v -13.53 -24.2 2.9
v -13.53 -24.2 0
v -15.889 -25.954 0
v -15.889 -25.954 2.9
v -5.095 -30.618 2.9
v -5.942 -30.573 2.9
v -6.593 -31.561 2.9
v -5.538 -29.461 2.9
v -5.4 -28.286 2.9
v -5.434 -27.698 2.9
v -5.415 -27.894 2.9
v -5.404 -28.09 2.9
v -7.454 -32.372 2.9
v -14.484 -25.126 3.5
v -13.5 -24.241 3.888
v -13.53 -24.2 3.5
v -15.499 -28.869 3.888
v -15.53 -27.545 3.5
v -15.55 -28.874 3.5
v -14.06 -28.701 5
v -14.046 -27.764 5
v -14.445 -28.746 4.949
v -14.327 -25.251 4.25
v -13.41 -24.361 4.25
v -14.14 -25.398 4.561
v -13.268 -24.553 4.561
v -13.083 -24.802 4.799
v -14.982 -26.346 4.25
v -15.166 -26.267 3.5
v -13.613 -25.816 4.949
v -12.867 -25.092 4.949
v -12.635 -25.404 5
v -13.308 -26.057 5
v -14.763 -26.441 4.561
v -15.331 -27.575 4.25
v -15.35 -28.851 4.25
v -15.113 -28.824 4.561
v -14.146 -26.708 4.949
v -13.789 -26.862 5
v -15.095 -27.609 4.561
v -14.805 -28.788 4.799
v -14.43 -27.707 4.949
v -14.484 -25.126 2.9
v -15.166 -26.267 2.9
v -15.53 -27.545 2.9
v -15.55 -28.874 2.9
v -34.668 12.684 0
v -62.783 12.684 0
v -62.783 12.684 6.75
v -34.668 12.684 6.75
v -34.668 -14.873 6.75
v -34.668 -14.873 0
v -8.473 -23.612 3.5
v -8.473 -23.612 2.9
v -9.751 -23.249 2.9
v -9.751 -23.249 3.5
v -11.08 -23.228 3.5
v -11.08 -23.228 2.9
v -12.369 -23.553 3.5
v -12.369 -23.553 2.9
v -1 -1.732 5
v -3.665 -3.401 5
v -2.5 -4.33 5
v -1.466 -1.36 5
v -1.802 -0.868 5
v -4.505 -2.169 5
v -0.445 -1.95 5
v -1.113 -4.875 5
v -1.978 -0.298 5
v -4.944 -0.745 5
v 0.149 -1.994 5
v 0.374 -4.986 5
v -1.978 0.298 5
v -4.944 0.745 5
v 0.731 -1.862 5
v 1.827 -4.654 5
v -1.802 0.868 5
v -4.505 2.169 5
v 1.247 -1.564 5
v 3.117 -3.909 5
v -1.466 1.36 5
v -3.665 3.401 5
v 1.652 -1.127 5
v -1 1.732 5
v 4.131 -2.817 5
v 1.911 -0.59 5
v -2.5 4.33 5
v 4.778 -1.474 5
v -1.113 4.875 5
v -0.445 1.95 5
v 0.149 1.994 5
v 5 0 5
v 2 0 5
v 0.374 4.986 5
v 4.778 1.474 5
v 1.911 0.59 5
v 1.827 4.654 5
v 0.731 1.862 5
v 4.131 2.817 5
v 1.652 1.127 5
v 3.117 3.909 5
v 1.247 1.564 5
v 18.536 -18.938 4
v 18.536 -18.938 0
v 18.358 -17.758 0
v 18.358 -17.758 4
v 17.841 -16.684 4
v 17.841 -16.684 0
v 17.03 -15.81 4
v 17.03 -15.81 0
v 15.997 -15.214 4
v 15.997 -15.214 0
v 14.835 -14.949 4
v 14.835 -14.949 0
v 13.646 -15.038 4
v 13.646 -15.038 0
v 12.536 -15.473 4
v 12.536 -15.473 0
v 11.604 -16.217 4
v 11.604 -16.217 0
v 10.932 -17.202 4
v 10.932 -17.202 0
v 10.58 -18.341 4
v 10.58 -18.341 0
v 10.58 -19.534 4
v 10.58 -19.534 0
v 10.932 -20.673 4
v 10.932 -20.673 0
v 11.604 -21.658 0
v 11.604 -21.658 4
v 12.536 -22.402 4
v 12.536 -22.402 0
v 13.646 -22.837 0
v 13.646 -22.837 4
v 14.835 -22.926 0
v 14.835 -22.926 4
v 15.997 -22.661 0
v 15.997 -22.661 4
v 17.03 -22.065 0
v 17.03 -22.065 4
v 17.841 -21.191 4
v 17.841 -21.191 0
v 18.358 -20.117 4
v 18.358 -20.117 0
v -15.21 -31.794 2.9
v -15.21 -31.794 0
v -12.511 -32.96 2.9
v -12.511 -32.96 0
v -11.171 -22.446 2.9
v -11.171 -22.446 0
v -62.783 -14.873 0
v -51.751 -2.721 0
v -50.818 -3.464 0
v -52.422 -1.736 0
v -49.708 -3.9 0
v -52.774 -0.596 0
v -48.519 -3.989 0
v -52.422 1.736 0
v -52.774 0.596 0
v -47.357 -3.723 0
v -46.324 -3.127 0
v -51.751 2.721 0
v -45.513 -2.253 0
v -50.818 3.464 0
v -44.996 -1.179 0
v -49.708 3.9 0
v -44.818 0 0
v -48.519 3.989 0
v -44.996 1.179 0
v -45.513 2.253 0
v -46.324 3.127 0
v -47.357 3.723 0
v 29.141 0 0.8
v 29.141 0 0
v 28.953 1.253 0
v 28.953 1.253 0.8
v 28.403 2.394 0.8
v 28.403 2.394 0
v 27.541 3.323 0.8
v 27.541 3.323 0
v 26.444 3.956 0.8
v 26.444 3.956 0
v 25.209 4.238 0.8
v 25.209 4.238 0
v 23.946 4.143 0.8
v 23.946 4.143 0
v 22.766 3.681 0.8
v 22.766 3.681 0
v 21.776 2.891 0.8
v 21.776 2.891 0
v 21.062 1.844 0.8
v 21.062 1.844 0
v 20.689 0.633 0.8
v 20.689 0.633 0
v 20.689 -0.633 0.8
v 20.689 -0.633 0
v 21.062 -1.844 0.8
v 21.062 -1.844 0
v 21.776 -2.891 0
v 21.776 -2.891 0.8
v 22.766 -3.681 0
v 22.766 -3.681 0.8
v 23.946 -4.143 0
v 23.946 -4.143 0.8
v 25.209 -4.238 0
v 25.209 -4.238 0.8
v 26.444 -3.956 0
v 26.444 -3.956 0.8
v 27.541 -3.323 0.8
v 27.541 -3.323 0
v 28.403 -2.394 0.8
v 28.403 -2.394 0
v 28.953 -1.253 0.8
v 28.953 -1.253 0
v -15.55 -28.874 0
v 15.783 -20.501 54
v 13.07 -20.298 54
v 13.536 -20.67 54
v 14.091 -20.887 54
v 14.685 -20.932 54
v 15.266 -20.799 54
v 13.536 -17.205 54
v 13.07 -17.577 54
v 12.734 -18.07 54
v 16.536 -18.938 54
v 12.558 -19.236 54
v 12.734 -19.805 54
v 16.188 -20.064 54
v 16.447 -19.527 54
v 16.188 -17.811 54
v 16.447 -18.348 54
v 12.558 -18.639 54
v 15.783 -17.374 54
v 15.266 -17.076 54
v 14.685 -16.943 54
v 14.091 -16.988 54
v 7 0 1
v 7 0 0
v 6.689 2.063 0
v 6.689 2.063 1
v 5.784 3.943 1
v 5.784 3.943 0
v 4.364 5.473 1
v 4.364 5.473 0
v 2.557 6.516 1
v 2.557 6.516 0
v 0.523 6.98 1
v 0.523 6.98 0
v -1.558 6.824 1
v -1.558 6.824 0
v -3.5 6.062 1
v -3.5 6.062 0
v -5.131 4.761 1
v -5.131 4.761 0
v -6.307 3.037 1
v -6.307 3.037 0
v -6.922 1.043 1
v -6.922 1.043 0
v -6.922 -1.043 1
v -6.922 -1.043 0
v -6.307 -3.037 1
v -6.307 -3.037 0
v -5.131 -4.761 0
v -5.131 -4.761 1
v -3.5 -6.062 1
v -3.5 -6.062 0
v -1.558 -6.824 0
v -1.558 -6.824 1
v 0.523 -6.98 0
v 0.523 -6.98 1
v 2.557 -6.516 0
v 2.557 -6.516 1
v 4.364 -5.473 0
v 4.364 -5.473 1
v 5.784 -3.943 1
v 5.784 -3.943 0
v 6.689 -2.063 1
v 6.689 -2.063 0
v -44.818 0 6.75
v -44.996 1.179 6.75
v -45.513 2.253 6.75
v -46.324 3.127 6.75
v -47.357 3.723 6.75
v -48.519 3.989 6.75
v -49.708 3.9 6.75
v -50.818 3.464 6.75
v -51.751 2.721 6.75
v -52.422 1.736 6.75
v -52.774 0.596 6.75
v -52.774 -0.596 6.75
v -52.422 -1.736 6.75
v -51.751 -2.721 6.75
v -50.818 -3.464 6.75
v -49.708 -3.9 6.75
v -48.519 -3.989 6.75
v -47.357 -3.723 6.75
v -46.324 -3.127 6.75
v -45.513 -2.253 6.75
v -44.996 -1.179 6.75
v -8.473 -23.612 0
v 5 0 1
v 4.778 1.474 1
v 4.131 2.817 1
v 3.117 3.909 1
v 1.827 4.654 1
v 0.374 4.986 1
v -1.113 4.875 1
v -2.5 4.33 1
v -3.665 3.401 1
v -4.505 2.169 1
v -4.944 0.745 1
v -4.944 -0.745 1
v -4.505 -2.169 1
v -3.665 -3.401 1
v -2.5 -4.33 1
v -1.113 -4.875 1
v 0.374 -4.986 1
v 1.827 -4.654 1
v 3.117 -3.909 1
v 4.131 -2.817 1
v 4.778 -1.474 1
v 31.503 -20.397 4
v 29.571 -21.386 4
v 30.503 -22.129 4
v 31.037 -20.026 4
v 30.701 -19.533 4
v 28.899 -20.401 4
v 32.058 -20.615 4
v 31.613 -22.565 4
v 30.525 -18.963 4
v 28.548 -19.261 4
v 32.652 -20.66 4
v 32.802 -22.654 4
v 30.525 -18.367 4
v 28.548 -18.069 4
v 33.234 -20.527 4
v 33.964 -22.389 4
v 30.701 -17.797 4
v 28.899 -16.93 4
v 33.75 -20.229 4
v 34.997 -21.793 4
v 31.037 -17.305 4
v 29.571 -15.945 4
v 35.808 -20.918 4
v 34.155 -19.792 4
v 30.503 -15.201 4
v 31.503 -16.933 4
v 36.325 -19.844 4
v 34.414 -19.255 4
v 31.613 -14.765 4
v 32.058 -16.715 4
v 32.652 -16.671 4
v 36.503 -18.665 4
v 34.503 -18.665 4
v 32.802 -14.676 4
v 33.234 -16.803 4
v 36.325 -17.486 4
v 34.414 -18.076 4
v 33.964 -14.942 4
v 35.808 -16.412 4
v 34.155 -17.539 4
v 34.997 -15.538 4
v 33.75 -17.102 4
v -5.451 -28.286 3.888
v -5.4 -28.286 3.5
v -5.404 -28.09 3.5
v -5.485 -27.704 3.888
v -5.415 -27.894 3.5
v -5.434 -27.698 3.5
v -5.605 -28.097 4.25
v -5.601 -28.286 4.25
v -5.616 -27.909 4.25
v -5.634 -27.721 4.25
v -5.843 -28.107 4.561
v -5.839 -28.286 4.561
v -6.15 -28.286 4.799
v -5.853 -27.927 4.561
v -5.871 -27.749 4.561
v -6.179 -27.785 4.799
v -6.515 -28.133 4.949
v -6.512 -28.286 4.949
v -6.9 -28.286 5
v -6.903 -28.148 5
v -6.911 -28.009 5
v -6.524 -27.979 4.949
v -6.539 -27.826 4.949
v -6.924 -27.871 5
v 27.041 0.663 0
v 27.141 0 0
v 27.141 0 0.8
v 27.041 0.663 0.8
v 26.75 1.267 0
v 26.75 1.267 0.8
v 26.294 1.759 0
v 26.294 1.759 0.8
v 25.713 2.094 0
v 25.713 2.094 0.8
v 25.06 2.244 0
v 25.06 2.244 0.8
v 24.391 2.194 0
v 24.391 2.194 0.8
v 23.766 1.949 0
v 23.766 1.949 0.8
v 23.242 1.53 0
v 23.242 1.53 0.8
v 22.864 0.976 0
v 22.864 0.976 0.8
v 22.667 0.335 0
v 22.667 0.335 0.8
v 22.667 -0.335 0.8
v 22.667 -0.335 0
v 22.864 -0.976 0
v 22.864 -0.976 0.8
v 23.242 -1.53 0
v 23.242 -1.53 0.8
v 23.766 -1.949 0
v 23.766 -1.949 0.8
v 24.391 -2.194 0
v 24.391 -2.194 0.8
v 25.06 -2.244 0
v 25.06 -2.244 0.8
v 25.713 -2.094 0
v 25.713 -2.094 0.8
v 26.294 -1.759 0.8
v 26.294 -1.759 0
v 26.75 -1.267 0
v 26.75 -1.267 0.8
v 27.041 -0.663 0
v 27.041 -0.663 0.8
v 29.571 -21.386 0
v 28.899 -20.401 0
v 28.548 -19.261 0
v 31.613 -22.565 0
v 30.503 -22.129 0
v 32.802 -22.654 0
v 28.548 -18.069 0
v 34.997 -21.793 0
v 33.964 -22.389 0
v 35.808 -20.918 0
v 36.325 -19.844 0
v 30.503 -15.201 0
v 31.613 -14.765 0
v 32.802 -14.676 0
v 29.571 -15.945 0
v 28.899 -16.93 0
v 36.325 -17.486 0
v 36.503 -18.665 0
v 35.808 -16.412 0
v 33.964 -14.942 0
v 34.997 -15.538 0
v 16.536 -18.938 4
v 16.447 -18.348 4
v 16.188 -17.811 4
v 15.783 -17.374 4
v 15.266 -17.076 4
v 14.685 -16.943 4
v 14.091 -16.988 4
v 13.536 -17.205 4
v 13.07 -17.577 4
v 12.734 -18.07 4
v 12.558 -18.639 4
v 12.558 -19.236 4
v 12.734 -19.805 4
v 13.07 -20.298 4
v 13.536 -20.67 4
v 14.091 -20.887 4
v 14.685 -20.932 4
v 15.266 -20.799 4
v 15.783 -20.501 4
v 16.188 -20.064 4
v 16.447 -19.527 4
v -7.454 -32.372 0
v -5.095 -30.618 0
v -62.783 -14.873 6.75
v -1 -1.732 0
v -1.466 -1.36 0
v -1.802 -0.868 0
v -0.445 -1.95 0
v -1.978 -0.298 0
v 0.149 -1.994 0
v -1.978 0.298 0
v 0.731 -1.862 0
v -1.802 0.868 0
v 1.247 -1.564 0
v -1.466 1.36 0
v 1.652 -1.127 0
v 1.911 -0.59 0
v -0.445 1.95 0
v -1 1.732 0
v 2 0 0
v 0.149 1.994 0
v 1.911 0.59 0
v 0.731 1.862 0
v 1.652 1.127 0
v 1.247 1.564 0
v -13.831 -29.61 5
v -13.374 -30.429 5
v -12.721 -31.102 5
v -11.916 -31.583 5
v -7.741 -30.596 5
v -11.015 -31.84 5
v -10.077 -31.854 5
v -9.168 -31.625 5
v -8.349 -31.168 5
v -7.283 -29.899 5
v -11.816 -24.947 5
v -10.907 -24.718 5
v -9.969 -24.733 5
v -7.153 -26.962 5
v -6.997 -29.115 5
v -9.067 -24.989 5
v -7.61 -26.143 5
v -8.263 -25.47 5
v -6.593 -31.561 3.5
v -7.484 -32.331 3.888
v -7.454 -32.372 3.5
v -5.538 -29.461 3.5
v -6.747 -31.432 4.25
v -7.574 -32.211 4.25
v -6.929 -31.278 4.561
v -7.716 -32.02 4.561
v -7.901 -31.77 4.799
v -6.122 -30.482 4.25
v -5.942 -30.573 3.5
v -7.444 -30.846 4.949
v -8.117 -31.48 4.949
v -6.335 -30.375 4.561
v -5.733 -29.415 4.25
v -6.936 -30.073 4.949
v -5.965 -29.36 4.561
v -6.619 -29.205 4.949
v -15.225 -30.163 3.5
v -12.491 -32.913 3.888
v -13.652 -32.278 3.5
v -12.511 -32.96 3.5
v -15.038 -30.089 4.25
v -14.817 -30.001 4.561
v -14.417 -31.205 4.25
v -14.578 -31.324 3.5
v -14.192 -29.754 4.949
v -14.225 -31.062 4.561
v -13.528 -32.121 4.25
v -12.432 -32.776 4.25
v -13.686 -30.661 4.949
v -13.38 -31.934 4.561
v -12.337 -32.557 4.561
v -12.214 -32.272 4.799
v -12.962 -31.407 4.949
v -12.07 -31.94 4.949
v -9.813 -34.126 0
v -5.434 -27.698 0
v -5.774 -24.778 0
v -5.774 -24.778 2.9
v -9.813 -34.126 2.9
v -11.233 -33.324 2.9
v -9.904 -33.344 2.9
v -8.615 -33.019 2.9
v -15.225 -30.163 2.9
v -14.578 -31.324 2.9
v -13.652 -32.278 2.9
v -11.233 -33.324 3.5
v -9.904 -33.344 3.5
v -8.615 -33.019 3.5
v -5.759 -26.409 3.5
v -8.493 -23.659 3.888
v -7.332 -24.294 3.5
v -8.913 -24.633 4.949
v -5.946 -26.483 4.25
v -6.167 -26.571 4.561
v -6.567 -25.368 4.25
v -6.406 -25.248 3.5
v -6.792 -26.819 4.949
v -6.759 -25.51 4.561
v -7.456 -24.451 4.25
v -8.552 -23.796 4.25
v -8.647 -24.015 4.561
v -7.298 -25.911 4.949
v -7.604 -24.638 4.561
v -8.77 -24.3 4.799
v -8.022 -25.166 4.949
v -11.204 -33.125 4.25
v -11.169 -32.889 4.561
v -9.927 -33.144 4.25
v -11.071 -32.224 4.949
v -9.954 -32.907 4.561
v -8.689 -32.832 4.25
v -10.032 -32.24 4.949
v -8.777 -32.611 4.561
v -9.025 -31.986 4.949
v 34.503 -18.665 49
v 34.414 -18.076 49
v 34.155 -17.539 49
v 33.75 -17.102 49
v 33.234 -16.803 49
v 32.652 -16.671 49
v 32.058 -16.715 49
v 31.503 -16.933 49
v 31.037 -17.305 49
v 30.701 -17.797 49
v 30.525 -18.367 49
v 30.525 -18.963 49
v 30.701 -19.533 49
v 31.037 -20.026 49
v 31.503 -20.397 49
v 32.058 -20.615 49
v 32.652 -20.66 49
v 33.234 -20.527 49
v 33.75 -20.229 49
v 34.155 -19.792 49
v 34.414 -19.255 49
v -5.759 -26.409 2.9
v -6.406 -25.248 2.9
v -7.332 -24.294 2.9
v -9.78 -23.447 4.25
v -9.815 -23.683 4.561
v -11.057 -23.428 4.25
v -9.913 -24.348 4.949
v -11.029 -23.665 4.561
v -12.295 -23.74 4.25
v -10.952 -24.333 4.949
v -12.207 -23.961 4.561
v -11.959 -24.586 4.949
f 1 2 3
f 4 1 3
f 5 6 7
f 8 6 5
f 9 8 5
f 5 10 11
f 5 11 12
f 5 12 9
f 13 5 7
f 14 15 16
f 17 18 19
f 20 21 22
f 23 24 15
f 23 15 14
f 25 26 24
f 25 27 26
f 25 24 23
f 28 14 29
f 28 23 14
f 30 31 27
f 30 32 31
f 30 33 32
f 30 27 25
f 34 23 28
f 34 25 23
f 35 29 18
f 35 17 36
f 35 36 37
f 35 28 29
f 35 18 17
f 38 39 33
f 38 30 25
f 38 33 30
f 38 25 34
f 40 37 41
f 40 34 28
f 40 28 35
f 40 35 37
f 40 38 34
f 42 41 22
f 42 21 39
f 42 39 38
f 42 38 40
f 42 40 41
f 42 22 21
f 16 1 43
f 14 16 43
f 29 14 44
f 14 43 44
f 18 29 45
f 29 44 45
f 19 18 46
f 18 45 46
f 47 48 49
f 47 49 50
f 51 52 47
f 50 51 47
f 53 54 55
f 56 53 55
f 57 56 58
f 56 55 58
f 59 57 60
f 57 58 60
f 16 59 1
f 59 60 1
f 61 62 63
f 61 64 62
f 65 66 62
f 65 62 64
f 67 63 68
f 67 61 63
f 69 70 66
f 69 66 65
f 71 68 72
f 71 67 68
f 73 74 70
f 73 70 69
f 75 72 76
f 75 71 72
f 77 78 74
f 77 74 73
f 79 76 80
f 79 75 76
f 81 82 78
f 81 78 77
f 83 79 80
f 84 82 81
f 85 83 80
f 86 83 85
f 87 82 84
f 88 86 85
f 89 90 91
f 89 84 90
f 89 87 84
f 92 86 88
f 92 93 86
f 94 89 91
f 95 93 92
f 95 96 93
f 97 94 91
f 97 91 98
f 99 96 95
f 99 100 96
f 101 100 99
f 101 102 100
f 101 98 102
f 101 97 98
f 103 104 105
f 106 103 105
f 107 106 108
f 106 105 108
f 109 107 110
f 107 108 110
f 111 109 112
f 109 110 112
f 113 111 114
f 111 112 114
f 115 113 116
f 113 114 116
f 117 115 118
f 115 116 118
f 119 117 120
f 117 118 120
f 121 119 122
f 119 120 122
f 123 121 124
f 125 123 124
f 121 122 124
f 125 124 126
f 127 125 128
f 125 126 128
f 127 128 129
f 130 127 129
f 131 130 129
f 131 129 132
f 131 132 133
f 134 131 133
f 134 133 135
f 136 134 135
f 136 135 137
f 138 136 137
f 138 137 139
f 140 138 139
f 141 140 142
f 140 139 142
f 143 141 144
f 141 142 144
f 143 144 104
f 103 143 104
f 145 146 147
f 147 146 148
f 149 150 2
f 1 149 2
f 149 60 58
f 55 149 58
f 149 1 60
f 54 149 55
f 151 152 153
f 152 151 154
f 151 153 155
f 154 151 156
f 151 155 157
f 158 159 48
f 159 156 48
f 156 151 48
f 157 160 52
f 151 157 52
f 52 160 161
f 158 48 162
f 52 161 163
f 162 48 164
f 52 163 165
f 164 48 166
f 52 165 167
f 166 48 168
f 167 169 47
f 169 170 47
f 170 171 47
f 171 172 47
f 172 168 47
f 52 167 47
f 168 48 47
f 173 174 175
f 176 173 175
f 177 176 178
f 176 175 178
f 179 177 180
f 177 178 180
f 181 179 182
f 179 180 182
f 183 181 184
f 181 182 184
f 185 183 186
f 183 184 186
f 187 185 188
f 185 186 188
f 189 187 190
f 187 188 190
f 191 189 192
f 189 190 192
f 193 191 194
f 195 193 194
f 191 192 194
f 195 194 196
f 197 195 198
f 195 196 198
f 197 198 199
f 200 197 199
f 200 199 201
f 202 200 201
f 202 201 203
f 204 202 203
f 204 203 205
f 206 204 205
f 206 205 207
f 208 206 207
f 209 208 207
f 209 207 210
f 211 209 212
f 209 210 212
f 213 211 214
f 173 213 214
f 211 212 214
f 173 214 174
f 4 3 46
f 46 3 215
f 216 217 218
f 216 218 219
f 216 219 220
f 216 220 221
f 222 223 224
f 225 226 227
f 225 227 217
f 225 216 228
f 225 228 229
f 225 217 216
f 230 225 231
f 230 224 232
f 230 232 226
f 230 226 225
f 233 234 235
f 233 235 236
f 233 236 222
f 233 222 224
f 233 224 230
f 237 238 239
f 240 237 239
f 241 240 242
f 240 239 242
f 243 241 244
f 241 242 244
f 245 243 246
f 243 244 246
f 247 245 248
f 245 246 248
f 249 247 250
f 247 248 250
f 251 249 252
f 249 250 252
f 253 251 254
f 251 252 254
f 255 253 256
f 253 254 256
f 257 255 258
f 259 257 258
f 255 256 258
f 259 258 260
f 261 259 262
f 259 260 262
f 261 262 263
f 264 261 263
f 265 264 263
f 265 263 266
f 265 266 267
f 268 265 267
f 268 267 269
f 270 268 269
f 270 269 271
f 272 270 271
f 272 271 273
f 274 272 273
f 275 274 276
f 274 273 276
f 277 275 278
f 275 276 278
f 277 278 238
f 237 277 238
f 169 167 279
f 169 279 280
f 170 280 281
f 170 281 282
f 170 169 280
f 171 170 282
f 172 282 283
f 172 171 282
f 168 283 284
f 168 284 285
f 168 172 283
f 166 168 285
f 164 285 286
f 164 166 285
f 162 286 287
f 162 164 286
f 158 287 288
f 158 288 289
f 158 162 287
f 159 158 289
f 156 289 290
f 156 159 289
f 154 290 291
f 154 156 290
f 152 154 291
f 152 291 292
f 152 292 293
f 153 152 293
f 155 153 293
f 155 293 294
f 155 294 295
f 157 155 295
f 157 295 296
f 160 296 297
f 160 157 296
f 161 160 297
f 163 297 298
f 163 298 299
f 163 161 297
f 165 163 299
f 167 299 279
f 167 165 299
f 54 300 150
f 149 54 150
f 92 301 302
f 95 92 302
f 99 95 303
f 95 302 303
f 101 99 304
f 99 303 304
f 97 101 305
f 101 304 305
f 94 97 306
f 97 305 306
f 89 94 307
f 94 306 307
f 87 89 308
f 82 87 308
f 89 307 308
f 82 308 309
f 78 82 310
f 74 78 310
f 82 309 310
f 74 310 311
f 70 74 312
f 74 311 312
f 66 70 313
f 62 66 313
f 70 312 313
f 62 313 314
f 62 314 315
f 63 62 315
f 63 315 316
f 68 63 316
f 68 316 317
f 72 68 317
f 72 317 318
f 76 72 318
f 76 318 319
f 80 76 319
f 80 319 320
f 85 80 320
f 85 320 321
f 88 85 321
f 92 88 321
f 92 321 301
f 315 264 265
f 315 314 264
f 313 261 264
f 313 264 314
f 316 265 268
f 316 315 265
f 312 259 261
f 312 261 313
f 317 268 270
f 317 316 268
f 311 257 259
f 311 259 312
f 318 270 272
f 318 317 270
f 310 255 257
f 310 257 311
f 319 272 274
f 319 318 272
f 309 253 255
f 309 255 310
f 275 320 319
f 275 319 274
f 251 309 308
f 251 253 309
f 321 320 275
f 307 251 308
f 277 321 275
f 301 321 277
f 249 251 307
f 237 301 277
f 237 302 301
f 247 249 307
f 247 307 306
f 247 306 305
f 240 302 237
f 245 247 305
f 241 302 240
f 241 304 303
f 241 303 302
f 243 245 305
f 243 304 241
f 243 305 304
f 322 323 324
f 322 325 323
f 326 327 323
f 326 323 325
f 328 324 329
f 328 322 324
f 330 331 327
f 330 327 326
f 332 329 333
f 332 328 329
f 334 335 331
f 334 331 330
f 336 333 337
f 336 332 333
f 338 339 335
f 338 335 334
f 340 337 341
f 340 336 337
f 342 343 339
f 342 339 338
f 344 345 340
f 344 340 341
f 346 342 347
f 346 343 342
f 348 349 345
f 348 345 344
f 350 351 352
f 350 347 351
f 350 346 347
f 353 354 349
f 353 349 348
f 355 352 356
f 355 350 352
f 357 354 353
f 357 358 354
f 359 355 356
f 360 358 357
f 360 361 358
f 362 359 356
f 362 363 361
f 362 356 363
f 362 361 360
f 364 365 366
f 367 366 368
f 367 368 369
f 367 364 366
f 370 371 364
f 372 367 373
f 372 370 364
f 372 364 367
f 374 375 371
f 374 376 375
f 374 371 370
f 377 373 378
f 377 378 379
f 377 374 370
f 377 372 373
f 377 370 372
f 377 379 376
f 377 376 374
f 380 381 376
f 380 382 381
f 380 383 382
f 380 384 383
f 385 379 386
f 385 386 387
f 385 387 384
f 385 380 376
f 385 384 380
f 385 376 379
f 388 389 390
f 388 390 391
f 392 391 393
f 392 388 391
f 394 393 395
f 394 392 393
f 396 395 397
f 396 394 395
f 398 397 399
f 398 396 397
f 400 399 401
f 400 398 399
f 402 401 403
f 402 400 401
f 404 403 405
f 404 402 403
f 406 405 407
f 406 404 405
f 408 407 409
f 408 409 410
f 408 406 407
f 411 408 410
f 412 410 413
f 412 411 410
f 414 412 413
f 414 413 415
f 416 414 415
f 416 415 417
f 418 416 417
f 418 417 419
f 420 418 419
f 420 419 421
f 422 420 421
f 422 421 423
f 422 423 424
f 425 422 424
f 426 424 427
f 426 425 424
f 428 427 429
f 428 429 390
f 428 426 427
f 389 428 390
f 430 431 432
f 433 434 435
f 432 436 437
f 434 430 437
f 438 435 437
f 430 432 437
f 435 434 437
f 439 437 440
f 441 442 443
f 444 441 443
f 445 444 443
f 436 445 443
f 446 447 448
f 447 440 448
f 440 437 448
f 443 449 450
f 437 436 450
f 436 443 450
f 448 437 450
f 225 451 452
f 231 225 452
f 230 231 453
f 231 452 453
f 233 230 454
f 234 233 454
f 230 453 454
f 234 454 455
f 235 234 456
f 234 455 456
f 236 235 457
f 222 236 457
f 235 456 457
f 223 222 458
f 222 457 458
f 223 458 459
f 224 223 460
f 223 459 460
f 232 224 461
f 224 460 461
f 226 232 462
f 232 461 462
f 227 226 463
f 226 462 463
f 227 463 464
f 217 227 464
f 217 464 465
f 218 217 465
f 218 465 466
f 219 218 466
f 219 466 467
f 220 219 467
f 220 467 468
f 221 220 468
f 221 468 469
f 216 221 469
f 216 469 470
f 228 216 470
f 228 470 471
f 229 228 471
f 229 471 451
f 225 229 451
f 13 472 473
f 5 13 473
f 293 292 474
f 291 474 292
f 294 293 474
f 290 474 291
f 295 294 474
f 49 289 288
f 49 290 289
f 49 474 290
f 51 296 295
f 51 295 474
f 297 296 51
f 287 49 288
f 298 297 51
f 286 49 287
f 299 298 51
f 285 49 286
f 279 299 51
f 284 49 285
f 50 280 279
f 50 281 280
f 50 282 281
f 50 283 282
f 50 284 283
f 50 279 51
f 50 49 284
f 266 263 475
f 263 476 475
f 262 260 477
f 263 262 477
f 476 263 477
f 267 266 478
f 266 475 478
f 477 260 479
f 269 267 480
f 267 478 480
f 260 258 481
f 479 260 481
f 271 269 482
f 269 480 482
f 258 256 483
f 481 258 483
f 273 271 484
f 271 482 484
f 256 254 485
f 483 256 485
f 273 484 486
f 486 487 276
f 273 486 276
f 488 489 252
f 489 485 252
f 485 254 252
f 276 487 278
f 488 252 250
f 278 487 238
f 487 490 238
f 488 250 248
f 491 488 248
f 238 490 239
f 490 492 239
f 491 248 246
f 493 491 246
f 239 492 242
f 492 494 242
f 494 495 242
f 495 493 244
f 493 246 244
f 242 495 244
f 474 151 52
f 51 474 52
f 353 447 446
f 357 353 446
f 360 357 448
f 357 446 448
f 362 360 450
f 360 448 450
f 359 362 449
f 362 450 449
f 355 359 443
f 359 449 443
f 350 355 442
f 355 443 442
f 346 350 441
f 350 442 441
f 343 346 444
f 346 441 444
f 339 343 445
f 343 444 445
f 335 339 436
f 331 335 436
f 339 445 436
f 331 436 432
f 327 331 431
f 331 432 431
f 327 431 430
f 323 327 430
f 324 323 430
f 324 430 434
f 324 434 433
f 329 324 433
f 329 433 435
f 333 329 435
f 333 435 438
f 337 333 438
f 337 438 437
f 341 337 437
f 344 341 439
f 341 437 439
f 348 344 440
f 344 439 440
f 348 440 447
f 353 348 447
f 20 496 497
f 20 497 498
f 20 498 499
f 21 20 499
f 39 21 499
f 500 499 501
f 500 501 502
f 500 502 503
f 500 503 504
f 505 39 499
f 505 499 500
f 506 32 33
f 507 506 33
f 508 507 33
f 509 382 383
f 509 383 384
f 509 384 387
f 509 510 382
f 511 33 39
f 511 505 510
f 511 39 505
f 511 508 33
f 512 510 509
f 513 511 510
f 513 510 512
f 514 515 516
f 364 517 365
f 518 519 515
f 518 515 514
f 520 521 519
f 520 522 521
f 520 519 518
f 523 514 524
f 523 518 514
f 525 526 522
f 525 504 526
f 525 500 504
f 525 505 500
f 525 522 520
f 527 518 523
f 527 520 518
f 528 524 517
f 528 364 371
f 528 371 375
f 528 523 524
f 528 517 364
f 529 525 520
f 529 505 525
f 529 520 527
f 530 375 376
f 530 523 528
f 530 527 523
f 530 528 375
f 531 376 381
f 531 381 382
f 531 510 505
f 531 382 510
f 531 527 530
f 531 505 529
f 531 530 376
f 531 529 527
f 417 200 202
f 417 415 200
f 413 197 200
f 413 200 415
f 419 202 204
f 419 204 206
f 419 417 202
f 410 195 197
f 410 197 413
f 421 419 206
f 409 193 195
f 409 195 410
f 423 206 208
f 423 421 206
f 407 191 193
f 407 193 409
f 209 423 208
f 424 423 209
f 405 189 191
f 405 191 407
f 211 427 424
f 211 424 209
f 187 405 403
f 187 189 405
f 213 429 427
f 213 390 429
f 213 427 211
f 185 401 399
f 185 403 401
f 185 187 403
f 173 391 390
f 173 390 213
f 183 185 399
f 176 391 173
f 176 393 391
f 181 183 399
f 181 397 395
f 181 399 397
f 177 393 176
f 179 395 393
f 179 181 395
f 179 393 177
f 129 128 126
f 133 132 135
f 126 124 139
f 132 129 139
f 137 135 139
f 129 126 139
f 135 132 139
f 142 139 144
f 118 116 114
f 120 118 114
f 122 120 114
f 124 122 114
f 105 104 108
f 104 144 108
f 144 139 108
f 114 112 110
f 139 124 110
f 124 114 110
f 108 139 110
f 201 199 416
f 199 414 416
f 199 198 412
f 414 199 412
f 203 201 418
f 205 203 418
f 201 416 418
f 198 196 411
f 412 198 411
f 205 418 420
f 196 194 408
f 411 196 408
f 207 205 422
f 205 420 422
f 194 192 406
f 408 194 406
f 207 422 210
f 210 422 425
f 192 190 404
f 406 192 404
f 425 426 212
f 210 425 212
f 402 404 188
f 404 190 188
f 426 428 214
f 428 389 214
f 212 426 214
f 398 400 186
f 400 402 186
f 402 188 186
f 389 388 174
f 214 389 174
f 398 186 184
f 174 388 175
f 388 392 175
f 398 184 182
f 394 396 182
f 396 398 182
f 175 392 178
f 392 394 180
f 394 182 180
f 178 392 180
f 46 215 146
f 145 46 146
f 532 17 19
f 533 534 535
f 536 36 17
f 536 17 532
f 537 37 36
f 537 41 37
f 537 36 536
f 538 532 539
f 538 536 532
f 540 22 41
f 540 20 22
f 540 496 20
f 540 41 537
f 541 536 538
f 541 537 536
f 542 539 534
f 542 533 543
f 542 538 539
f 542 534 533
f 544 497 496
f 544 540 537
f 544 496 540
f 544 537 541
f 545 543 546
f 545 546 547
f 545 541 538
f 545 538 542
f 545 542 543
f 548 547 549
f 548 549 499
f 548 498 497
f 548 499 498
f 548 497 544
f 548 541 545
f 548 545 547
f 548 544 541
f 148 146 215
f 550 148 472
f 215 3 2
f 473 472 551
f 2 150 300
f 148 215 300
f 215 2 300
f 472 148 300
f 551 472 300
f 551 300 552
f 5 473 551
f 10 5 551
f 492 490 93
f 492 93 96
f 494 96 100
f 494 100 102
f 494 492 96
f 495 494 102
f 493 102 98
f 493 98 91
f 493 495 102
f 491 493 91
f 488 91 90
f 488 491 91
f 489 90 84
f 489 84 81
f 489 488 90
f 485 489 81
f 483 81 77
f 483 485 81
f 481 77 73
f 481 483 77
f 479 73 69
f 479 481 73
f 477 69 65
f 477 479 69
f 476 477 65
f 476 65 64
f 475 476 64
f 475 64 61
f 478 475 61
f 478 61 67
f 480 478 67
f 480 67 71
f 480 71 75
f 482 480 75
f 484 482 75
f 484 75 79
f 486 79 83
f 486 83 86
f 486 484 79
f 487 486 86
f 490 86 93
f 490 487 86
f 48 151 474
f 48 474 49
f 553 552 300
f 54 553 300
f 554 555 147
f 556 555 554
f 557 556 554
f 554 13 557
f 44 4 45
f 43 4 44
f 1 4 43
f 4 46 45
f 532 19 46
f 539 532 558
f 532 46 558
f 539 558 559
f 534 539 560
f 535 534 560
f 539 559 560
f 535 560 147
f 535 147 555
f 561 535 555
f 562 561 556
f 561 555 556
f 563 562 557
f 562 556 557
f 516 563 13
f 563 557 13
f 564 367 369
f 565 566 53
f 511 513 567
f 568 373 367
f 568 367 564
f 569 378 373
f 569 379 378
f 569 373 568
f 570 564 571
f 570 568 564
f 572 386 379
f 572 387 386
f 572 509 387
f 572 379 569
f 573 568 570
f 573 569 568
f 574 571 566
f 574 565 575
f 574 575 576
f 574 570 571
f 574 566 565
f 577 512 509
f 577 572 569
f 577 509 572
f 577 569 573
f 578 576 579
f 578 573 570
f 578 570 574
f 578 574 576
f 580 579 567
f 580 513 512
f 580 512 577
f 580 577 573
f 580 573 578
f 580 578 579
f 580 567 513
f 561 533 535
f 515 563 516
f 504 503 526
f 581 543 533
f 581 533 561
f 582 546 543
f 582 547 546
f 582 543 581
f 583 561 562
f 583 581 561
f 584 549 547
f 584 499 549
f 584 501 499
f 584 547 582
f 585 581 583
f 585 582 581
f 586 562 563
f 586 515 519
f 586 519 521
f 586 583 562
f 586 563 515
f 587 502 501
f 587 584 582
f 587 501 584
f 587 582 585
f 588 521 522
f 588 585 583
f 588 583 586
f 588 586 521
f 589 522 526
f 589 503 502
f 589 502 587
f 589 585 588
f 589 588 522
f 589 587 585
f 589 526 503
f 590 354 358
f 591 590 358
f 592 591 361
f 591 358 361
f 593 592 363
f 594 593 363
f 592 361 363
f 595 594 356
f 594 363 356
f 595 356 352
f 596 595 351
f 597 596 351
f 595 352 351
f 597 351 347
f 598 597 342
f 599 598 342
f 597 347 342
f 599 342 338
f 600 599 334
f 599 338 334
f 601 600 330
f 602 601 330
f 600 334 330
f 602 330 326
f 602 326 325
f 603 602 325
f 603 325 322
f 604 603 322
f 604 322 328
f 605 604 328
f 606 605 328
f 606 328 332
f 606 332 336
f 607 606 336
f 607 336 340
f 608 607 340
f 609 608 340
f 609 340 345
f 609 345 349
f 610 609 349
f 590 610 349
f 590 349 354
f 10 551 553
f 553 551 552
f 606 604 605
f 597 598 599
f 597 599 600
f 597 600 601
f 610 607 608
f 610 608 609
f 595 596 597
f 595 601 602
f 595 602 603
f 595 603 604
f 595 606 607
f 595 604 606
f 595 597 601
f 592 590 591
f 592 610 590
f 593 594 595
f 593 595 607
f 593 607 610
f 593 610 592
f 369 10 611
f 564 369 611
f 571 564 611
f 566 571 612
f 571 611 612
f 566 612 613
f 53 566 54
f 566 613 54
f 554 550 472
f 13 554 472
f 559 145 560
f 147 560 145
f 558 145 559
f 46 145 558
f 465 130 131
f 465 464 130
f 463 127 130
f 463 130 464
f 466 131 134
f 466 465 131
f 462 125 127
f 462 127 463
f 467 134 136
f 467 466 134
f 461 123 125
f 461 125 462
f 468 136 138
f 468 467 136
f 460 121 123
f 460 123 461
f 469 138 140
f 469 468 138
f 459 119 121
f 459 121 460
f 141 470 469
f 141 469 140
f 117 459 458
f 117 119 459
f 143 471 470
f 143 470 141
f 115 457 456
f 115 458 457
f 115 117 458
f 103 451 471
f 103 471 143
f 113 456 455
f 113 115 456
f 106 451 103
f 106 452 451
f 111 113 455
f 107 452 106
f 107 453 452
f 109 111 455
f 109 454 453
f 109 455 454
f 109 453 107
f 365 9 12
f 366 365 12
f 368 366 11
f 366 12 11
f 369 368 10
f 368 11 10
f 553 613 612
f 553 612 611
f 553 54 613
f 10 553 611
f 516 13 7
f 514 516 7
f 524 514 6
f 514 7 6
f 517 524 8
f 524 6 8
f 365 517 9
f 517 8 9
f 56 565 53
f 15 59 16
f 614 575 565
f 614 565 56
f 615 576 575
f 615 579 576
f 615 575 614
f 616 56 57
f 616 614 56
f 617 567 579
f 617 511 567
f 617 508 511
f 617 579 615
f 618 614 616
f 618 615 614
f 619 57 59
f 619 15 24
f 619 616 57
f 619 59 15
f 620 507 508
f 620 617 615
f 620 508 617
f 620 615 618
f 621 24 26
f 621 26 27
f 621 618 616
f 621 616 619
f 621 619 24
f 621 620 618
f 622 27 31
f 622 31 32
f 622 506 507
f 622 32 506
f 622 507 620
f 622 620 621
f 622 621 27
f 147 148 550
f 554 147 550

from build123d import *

# Parameters (mm, degrees)
F0_R      = 7
F0_R_2    = 5
F0_R_3    = 4
F1_DEPTH  = 1
F0_R_4    = 2
F2_DEPTH  = 5
F3_R      = 4.25
F3_R_2    = 2.25
F4_DEPTH  = 0.8
F5_W      = 28.1152857468
F5_H      = 27.5567038742
F5_R      = 4
F6_DEPTH  = 6.75
F7_R      = 4
F7_R_2    = 2
F8_DEPTH  = 4
F9_DEPTH  = 49
F11_DEPTH = 2.9
F12_DEPTH = 5
F13_R     = 1.5
F14_DEPTH = 4
F15_DEPTH = 54


with BuildPart() as f1:
    # F0 (on Top) → F1 (new body)
    with BuildSketch(Plane.XY):
        Circle(F0_R)
        Circle(F0_R_2, mode=Mode.SUBTRACT)
        Circle(F0_R_2)
        Circle(F0_R_3, mode=Mode.SUBTRACT)
    extrude(amount=F1_DEPTH)

    # F0 (on Top) → F2 (join)
    with BuildSketch(Plane.XY):
        Circle(F0_R_2)
        Circle(F0_R_3, mode=Mode.SUBTRACT)
        Circle(F0_R_3)
        Circle(F0_R_4, mode=Mode.SUBTRACT)
    extrude(amount=F2_DEPTH)


with BuildPart() as f4:
    # F3 (on Top) → F4 (new body)
    with BuildSketch(Plane.XY):
        with Locations((24.8914246002, 0)):
            Circle(F3_R)
        with Locations((24.8914246002, 0)):
            Circle(F3_R_2, mode=Mode.SUBTRACT)
    extrude(amount=F4_DEPTH)


with BuildPart() as f6:
    # F5 (on Top) → F6 (new body)
    with BuildSketch(Plane.XY):
        with Locations((-48.7253048121, -1.0946599618)):
            Rectangle(F5_W, F5_H)
        with Locations((-48.8184041844, 0)):
            Circle(F5_R, mode=Mode.SUBTRACT)
    extrude(amount=F6_DEPTH)


with BuildPart() as f8:
    # F7 (on Top) → F8 (new body)
    with BuildSketch(Plane.XY):
        with Locations((32.5029231608, -18.6652038246)):
            Circle(F7_R)
        with Locations((32.5029231608, -18.6652038246)):
            Circle(F7_R_2, mode=Mode.SUBTRACT)
    extrude(amount=F8_DEPTH)

    # F7 (on Top) → F9 (join)
    with BuildSketch(Plane.XY):
        with Locations((32.5029231608, -18.6652038246)):
            Circle(F7_R_2)
    extrude(amount=F9_DEPTH)


with BuildPart() as f11:
    # F10 (on Top) → F11 (new body)
    with BuildSketch(Plane.XY):
        with BuildLine():
            ThreePointArc((-7.4536366299, -32.3721504943), (-5.9423756755, -30.5726572777), (-5.4001240137, -28.2861646265))
            ThreePointArc((-5.4001240137, -28.2861646265), (-5.4086546626, -27.9915460171), (-5.4342180254, -27.697914596))
            ThreePointArc((-5.4342180254, -27.697914596), (-6.4059486347, -25.2478667892), (-8.4725159624, -23.6119284918))
            ThreePointArc((-8.4725159624, -23.6119284918), (-11.0801847843, -23.2284480643), (-13.5302324506, -24.2001786625))
            ThreePointArc((-13.5302324506, -24.2001786625), (-15.1661706931, -26.2667458763), (-15.5496511793, -28.874414701))
            ThreePointArc((-15.5496511793, -28.874414701), (-14.5779206101, -31.3244624168), (-12.5113533955, -32.9604006972))
            ThreePointArc((-12.5113533955, -32.9604006972), (-9.9036844256, -33.3438811887), (-7.4536366299, -32.3721504943))
        make_face()
        with BuildLine():
            Line((-15.2100247739, -31.7944888162), (-12.5113533955, -32.9604006972))
            ThreePointArc((-12.5113533955, -32.9604006972), (-14.5779206101, -31.3244624168), (-15.5496511793, -28.874414701))
            Line((-15.5496511793, -28.874414701), (-15.2100247739, -31.7944888162))
        make_face()
        with BuildLine():
            Line((-9.8126818164, -34.126312665), (-7.4536366299, -32.3721504943))
            ThreePointArc((-7.4536366299, -32.3721504943), (-9.9036844256, -33.3438811887), (-12.5113533955, -32.9604006972))
            Line((-12.5113533955, -32.9604006972), (-9.8126818164, -34.126312665))
        make_face()
        with BuildLine():
            ThreePointArc((-5.4342180254, -27.697914596), (-5.4086546626, -27.9915460171), (-5.4001240137, -28.2861646265))
            ThreePointArc((-5.4001240137, -28.2861646265), (-5.9423756755, -30.5726572777), (-7.4536366299, -32.3721504943))
            Line((-7.4536366299, -32.3721504943), (-5.0945916475, -30.6179884753))
            Line((-5.0945916475, -30.6179884753), (-5.4342180254, -27.697914596))
        make_face()
        with BuildLine():
            ThreePointArc((-15.5496511793, -28.874414701), (-15.1661706931, -26.2667458763), (-13.5302324506, -24.2001786625))
            Line((-13.5302324506, -24.2001786625), (-15.8892775624, -25.9543407777))
            Line((-15.8892775624, -25.9543407777), (-15.5496511793, -28.874414701))
        make_face()
        with BuildLine():
            ThreePointArc((-8.4725159624, -23.6119284918), (-6.4059486347, -25.2478667892), (-5.4342180254, -27.697914596))
            Line((-5.4342180254, -27.697914596), (-5.773844436, -24.7778404368))
            Line((-5.773844436, -24.7778404368), (-8.4725159624, -23.6119284918))
        make_face()
        with BuildLine():
            ThreePointArc((-13.5302324506, -24.2001786625), (-11.0801847843, -23.2284480643), (-8.4725159624, -23.6119284918))
            Line((-8.4725159624, -23.6119284918), (-11.1711873934, -22.446016588))
            Line((-11.1711873934, -22.446016588), (-13.5302324506, -24.2001786625))
        make_face()
    extrude(amount=F11_DEPTH)

    # F10 (on Top) → F12 (join)
    with BuildSketch(Plane.XY):
        with BuildLine():
            ThreePointArc((-7.4536366299, -32.3721504943), (-5.9423756755, -30.5726572777), (-5.4001240137, -28.2861646265))
            ThreePointArc((-5.4001240137, -28.2861646265), (-5.4086546626, -27.9915460171), (-5.4342180254, -27.697914596))
            ThreePointArc((-5.4342180254, -27.697914596), (-6.4059486347, -25.2478667892), (-8.4725159624, -23.6119284918))
            ThreePointArc((-8.4725159624, -23.6119284918), (-11.0801847843, -23.2284480643), (-13.5302324506, -24.2001786625))
            ThreePointArc((-13.5302324506, -24.2001786625), (-15.1661706931, -26.2667458763), (-15.5496511793, -28.874414701))
            ThreePointArc((-15.5496511793, -28.874414701), (-14.5779206101, -31.3244624168), (-12.5113533955, -32.9604006972))
            ThreePointArc((-12.5113533955, -32.9604006972), (-9.9036844256, -33.3438811887), (-7.4536366299, -32.3721504943))
        make_face()
    extrude(amount=F12_DEPTH)

    # F13
    f13_edges = [f11.edges().sort_by_distance(p)[0] for p in [
        (-5.434218, -27.697915, 5),
    ]]
    fillet(f13_edges, radius=F13_R)


with BuildPart() as f14:
    # F7 (on Top) → F14 (new body)
    with BuildSketch(Plane.XY):
        with Locations((14.5357996225, -18.9375132322)):
            Circle(F7_R)
        with Locations((14.5357996225, -18.9375132322)):
            Circle(F7_R_2, mode=Mode.SUBTRACT)
    extrude(amount=F14_DEPTH)

    # F7 (on Top) → F15 (join)
    with BuildSketch(Plane.XY):
        with Locations((14.5357996225, -18.9375132322)):
            Circle(F7_R_2)
    extrude(amount=F15_DEPTH)


solid = Compound([f1.part, f4.part, f6.part, f8.part, f11.part, f14.part])
